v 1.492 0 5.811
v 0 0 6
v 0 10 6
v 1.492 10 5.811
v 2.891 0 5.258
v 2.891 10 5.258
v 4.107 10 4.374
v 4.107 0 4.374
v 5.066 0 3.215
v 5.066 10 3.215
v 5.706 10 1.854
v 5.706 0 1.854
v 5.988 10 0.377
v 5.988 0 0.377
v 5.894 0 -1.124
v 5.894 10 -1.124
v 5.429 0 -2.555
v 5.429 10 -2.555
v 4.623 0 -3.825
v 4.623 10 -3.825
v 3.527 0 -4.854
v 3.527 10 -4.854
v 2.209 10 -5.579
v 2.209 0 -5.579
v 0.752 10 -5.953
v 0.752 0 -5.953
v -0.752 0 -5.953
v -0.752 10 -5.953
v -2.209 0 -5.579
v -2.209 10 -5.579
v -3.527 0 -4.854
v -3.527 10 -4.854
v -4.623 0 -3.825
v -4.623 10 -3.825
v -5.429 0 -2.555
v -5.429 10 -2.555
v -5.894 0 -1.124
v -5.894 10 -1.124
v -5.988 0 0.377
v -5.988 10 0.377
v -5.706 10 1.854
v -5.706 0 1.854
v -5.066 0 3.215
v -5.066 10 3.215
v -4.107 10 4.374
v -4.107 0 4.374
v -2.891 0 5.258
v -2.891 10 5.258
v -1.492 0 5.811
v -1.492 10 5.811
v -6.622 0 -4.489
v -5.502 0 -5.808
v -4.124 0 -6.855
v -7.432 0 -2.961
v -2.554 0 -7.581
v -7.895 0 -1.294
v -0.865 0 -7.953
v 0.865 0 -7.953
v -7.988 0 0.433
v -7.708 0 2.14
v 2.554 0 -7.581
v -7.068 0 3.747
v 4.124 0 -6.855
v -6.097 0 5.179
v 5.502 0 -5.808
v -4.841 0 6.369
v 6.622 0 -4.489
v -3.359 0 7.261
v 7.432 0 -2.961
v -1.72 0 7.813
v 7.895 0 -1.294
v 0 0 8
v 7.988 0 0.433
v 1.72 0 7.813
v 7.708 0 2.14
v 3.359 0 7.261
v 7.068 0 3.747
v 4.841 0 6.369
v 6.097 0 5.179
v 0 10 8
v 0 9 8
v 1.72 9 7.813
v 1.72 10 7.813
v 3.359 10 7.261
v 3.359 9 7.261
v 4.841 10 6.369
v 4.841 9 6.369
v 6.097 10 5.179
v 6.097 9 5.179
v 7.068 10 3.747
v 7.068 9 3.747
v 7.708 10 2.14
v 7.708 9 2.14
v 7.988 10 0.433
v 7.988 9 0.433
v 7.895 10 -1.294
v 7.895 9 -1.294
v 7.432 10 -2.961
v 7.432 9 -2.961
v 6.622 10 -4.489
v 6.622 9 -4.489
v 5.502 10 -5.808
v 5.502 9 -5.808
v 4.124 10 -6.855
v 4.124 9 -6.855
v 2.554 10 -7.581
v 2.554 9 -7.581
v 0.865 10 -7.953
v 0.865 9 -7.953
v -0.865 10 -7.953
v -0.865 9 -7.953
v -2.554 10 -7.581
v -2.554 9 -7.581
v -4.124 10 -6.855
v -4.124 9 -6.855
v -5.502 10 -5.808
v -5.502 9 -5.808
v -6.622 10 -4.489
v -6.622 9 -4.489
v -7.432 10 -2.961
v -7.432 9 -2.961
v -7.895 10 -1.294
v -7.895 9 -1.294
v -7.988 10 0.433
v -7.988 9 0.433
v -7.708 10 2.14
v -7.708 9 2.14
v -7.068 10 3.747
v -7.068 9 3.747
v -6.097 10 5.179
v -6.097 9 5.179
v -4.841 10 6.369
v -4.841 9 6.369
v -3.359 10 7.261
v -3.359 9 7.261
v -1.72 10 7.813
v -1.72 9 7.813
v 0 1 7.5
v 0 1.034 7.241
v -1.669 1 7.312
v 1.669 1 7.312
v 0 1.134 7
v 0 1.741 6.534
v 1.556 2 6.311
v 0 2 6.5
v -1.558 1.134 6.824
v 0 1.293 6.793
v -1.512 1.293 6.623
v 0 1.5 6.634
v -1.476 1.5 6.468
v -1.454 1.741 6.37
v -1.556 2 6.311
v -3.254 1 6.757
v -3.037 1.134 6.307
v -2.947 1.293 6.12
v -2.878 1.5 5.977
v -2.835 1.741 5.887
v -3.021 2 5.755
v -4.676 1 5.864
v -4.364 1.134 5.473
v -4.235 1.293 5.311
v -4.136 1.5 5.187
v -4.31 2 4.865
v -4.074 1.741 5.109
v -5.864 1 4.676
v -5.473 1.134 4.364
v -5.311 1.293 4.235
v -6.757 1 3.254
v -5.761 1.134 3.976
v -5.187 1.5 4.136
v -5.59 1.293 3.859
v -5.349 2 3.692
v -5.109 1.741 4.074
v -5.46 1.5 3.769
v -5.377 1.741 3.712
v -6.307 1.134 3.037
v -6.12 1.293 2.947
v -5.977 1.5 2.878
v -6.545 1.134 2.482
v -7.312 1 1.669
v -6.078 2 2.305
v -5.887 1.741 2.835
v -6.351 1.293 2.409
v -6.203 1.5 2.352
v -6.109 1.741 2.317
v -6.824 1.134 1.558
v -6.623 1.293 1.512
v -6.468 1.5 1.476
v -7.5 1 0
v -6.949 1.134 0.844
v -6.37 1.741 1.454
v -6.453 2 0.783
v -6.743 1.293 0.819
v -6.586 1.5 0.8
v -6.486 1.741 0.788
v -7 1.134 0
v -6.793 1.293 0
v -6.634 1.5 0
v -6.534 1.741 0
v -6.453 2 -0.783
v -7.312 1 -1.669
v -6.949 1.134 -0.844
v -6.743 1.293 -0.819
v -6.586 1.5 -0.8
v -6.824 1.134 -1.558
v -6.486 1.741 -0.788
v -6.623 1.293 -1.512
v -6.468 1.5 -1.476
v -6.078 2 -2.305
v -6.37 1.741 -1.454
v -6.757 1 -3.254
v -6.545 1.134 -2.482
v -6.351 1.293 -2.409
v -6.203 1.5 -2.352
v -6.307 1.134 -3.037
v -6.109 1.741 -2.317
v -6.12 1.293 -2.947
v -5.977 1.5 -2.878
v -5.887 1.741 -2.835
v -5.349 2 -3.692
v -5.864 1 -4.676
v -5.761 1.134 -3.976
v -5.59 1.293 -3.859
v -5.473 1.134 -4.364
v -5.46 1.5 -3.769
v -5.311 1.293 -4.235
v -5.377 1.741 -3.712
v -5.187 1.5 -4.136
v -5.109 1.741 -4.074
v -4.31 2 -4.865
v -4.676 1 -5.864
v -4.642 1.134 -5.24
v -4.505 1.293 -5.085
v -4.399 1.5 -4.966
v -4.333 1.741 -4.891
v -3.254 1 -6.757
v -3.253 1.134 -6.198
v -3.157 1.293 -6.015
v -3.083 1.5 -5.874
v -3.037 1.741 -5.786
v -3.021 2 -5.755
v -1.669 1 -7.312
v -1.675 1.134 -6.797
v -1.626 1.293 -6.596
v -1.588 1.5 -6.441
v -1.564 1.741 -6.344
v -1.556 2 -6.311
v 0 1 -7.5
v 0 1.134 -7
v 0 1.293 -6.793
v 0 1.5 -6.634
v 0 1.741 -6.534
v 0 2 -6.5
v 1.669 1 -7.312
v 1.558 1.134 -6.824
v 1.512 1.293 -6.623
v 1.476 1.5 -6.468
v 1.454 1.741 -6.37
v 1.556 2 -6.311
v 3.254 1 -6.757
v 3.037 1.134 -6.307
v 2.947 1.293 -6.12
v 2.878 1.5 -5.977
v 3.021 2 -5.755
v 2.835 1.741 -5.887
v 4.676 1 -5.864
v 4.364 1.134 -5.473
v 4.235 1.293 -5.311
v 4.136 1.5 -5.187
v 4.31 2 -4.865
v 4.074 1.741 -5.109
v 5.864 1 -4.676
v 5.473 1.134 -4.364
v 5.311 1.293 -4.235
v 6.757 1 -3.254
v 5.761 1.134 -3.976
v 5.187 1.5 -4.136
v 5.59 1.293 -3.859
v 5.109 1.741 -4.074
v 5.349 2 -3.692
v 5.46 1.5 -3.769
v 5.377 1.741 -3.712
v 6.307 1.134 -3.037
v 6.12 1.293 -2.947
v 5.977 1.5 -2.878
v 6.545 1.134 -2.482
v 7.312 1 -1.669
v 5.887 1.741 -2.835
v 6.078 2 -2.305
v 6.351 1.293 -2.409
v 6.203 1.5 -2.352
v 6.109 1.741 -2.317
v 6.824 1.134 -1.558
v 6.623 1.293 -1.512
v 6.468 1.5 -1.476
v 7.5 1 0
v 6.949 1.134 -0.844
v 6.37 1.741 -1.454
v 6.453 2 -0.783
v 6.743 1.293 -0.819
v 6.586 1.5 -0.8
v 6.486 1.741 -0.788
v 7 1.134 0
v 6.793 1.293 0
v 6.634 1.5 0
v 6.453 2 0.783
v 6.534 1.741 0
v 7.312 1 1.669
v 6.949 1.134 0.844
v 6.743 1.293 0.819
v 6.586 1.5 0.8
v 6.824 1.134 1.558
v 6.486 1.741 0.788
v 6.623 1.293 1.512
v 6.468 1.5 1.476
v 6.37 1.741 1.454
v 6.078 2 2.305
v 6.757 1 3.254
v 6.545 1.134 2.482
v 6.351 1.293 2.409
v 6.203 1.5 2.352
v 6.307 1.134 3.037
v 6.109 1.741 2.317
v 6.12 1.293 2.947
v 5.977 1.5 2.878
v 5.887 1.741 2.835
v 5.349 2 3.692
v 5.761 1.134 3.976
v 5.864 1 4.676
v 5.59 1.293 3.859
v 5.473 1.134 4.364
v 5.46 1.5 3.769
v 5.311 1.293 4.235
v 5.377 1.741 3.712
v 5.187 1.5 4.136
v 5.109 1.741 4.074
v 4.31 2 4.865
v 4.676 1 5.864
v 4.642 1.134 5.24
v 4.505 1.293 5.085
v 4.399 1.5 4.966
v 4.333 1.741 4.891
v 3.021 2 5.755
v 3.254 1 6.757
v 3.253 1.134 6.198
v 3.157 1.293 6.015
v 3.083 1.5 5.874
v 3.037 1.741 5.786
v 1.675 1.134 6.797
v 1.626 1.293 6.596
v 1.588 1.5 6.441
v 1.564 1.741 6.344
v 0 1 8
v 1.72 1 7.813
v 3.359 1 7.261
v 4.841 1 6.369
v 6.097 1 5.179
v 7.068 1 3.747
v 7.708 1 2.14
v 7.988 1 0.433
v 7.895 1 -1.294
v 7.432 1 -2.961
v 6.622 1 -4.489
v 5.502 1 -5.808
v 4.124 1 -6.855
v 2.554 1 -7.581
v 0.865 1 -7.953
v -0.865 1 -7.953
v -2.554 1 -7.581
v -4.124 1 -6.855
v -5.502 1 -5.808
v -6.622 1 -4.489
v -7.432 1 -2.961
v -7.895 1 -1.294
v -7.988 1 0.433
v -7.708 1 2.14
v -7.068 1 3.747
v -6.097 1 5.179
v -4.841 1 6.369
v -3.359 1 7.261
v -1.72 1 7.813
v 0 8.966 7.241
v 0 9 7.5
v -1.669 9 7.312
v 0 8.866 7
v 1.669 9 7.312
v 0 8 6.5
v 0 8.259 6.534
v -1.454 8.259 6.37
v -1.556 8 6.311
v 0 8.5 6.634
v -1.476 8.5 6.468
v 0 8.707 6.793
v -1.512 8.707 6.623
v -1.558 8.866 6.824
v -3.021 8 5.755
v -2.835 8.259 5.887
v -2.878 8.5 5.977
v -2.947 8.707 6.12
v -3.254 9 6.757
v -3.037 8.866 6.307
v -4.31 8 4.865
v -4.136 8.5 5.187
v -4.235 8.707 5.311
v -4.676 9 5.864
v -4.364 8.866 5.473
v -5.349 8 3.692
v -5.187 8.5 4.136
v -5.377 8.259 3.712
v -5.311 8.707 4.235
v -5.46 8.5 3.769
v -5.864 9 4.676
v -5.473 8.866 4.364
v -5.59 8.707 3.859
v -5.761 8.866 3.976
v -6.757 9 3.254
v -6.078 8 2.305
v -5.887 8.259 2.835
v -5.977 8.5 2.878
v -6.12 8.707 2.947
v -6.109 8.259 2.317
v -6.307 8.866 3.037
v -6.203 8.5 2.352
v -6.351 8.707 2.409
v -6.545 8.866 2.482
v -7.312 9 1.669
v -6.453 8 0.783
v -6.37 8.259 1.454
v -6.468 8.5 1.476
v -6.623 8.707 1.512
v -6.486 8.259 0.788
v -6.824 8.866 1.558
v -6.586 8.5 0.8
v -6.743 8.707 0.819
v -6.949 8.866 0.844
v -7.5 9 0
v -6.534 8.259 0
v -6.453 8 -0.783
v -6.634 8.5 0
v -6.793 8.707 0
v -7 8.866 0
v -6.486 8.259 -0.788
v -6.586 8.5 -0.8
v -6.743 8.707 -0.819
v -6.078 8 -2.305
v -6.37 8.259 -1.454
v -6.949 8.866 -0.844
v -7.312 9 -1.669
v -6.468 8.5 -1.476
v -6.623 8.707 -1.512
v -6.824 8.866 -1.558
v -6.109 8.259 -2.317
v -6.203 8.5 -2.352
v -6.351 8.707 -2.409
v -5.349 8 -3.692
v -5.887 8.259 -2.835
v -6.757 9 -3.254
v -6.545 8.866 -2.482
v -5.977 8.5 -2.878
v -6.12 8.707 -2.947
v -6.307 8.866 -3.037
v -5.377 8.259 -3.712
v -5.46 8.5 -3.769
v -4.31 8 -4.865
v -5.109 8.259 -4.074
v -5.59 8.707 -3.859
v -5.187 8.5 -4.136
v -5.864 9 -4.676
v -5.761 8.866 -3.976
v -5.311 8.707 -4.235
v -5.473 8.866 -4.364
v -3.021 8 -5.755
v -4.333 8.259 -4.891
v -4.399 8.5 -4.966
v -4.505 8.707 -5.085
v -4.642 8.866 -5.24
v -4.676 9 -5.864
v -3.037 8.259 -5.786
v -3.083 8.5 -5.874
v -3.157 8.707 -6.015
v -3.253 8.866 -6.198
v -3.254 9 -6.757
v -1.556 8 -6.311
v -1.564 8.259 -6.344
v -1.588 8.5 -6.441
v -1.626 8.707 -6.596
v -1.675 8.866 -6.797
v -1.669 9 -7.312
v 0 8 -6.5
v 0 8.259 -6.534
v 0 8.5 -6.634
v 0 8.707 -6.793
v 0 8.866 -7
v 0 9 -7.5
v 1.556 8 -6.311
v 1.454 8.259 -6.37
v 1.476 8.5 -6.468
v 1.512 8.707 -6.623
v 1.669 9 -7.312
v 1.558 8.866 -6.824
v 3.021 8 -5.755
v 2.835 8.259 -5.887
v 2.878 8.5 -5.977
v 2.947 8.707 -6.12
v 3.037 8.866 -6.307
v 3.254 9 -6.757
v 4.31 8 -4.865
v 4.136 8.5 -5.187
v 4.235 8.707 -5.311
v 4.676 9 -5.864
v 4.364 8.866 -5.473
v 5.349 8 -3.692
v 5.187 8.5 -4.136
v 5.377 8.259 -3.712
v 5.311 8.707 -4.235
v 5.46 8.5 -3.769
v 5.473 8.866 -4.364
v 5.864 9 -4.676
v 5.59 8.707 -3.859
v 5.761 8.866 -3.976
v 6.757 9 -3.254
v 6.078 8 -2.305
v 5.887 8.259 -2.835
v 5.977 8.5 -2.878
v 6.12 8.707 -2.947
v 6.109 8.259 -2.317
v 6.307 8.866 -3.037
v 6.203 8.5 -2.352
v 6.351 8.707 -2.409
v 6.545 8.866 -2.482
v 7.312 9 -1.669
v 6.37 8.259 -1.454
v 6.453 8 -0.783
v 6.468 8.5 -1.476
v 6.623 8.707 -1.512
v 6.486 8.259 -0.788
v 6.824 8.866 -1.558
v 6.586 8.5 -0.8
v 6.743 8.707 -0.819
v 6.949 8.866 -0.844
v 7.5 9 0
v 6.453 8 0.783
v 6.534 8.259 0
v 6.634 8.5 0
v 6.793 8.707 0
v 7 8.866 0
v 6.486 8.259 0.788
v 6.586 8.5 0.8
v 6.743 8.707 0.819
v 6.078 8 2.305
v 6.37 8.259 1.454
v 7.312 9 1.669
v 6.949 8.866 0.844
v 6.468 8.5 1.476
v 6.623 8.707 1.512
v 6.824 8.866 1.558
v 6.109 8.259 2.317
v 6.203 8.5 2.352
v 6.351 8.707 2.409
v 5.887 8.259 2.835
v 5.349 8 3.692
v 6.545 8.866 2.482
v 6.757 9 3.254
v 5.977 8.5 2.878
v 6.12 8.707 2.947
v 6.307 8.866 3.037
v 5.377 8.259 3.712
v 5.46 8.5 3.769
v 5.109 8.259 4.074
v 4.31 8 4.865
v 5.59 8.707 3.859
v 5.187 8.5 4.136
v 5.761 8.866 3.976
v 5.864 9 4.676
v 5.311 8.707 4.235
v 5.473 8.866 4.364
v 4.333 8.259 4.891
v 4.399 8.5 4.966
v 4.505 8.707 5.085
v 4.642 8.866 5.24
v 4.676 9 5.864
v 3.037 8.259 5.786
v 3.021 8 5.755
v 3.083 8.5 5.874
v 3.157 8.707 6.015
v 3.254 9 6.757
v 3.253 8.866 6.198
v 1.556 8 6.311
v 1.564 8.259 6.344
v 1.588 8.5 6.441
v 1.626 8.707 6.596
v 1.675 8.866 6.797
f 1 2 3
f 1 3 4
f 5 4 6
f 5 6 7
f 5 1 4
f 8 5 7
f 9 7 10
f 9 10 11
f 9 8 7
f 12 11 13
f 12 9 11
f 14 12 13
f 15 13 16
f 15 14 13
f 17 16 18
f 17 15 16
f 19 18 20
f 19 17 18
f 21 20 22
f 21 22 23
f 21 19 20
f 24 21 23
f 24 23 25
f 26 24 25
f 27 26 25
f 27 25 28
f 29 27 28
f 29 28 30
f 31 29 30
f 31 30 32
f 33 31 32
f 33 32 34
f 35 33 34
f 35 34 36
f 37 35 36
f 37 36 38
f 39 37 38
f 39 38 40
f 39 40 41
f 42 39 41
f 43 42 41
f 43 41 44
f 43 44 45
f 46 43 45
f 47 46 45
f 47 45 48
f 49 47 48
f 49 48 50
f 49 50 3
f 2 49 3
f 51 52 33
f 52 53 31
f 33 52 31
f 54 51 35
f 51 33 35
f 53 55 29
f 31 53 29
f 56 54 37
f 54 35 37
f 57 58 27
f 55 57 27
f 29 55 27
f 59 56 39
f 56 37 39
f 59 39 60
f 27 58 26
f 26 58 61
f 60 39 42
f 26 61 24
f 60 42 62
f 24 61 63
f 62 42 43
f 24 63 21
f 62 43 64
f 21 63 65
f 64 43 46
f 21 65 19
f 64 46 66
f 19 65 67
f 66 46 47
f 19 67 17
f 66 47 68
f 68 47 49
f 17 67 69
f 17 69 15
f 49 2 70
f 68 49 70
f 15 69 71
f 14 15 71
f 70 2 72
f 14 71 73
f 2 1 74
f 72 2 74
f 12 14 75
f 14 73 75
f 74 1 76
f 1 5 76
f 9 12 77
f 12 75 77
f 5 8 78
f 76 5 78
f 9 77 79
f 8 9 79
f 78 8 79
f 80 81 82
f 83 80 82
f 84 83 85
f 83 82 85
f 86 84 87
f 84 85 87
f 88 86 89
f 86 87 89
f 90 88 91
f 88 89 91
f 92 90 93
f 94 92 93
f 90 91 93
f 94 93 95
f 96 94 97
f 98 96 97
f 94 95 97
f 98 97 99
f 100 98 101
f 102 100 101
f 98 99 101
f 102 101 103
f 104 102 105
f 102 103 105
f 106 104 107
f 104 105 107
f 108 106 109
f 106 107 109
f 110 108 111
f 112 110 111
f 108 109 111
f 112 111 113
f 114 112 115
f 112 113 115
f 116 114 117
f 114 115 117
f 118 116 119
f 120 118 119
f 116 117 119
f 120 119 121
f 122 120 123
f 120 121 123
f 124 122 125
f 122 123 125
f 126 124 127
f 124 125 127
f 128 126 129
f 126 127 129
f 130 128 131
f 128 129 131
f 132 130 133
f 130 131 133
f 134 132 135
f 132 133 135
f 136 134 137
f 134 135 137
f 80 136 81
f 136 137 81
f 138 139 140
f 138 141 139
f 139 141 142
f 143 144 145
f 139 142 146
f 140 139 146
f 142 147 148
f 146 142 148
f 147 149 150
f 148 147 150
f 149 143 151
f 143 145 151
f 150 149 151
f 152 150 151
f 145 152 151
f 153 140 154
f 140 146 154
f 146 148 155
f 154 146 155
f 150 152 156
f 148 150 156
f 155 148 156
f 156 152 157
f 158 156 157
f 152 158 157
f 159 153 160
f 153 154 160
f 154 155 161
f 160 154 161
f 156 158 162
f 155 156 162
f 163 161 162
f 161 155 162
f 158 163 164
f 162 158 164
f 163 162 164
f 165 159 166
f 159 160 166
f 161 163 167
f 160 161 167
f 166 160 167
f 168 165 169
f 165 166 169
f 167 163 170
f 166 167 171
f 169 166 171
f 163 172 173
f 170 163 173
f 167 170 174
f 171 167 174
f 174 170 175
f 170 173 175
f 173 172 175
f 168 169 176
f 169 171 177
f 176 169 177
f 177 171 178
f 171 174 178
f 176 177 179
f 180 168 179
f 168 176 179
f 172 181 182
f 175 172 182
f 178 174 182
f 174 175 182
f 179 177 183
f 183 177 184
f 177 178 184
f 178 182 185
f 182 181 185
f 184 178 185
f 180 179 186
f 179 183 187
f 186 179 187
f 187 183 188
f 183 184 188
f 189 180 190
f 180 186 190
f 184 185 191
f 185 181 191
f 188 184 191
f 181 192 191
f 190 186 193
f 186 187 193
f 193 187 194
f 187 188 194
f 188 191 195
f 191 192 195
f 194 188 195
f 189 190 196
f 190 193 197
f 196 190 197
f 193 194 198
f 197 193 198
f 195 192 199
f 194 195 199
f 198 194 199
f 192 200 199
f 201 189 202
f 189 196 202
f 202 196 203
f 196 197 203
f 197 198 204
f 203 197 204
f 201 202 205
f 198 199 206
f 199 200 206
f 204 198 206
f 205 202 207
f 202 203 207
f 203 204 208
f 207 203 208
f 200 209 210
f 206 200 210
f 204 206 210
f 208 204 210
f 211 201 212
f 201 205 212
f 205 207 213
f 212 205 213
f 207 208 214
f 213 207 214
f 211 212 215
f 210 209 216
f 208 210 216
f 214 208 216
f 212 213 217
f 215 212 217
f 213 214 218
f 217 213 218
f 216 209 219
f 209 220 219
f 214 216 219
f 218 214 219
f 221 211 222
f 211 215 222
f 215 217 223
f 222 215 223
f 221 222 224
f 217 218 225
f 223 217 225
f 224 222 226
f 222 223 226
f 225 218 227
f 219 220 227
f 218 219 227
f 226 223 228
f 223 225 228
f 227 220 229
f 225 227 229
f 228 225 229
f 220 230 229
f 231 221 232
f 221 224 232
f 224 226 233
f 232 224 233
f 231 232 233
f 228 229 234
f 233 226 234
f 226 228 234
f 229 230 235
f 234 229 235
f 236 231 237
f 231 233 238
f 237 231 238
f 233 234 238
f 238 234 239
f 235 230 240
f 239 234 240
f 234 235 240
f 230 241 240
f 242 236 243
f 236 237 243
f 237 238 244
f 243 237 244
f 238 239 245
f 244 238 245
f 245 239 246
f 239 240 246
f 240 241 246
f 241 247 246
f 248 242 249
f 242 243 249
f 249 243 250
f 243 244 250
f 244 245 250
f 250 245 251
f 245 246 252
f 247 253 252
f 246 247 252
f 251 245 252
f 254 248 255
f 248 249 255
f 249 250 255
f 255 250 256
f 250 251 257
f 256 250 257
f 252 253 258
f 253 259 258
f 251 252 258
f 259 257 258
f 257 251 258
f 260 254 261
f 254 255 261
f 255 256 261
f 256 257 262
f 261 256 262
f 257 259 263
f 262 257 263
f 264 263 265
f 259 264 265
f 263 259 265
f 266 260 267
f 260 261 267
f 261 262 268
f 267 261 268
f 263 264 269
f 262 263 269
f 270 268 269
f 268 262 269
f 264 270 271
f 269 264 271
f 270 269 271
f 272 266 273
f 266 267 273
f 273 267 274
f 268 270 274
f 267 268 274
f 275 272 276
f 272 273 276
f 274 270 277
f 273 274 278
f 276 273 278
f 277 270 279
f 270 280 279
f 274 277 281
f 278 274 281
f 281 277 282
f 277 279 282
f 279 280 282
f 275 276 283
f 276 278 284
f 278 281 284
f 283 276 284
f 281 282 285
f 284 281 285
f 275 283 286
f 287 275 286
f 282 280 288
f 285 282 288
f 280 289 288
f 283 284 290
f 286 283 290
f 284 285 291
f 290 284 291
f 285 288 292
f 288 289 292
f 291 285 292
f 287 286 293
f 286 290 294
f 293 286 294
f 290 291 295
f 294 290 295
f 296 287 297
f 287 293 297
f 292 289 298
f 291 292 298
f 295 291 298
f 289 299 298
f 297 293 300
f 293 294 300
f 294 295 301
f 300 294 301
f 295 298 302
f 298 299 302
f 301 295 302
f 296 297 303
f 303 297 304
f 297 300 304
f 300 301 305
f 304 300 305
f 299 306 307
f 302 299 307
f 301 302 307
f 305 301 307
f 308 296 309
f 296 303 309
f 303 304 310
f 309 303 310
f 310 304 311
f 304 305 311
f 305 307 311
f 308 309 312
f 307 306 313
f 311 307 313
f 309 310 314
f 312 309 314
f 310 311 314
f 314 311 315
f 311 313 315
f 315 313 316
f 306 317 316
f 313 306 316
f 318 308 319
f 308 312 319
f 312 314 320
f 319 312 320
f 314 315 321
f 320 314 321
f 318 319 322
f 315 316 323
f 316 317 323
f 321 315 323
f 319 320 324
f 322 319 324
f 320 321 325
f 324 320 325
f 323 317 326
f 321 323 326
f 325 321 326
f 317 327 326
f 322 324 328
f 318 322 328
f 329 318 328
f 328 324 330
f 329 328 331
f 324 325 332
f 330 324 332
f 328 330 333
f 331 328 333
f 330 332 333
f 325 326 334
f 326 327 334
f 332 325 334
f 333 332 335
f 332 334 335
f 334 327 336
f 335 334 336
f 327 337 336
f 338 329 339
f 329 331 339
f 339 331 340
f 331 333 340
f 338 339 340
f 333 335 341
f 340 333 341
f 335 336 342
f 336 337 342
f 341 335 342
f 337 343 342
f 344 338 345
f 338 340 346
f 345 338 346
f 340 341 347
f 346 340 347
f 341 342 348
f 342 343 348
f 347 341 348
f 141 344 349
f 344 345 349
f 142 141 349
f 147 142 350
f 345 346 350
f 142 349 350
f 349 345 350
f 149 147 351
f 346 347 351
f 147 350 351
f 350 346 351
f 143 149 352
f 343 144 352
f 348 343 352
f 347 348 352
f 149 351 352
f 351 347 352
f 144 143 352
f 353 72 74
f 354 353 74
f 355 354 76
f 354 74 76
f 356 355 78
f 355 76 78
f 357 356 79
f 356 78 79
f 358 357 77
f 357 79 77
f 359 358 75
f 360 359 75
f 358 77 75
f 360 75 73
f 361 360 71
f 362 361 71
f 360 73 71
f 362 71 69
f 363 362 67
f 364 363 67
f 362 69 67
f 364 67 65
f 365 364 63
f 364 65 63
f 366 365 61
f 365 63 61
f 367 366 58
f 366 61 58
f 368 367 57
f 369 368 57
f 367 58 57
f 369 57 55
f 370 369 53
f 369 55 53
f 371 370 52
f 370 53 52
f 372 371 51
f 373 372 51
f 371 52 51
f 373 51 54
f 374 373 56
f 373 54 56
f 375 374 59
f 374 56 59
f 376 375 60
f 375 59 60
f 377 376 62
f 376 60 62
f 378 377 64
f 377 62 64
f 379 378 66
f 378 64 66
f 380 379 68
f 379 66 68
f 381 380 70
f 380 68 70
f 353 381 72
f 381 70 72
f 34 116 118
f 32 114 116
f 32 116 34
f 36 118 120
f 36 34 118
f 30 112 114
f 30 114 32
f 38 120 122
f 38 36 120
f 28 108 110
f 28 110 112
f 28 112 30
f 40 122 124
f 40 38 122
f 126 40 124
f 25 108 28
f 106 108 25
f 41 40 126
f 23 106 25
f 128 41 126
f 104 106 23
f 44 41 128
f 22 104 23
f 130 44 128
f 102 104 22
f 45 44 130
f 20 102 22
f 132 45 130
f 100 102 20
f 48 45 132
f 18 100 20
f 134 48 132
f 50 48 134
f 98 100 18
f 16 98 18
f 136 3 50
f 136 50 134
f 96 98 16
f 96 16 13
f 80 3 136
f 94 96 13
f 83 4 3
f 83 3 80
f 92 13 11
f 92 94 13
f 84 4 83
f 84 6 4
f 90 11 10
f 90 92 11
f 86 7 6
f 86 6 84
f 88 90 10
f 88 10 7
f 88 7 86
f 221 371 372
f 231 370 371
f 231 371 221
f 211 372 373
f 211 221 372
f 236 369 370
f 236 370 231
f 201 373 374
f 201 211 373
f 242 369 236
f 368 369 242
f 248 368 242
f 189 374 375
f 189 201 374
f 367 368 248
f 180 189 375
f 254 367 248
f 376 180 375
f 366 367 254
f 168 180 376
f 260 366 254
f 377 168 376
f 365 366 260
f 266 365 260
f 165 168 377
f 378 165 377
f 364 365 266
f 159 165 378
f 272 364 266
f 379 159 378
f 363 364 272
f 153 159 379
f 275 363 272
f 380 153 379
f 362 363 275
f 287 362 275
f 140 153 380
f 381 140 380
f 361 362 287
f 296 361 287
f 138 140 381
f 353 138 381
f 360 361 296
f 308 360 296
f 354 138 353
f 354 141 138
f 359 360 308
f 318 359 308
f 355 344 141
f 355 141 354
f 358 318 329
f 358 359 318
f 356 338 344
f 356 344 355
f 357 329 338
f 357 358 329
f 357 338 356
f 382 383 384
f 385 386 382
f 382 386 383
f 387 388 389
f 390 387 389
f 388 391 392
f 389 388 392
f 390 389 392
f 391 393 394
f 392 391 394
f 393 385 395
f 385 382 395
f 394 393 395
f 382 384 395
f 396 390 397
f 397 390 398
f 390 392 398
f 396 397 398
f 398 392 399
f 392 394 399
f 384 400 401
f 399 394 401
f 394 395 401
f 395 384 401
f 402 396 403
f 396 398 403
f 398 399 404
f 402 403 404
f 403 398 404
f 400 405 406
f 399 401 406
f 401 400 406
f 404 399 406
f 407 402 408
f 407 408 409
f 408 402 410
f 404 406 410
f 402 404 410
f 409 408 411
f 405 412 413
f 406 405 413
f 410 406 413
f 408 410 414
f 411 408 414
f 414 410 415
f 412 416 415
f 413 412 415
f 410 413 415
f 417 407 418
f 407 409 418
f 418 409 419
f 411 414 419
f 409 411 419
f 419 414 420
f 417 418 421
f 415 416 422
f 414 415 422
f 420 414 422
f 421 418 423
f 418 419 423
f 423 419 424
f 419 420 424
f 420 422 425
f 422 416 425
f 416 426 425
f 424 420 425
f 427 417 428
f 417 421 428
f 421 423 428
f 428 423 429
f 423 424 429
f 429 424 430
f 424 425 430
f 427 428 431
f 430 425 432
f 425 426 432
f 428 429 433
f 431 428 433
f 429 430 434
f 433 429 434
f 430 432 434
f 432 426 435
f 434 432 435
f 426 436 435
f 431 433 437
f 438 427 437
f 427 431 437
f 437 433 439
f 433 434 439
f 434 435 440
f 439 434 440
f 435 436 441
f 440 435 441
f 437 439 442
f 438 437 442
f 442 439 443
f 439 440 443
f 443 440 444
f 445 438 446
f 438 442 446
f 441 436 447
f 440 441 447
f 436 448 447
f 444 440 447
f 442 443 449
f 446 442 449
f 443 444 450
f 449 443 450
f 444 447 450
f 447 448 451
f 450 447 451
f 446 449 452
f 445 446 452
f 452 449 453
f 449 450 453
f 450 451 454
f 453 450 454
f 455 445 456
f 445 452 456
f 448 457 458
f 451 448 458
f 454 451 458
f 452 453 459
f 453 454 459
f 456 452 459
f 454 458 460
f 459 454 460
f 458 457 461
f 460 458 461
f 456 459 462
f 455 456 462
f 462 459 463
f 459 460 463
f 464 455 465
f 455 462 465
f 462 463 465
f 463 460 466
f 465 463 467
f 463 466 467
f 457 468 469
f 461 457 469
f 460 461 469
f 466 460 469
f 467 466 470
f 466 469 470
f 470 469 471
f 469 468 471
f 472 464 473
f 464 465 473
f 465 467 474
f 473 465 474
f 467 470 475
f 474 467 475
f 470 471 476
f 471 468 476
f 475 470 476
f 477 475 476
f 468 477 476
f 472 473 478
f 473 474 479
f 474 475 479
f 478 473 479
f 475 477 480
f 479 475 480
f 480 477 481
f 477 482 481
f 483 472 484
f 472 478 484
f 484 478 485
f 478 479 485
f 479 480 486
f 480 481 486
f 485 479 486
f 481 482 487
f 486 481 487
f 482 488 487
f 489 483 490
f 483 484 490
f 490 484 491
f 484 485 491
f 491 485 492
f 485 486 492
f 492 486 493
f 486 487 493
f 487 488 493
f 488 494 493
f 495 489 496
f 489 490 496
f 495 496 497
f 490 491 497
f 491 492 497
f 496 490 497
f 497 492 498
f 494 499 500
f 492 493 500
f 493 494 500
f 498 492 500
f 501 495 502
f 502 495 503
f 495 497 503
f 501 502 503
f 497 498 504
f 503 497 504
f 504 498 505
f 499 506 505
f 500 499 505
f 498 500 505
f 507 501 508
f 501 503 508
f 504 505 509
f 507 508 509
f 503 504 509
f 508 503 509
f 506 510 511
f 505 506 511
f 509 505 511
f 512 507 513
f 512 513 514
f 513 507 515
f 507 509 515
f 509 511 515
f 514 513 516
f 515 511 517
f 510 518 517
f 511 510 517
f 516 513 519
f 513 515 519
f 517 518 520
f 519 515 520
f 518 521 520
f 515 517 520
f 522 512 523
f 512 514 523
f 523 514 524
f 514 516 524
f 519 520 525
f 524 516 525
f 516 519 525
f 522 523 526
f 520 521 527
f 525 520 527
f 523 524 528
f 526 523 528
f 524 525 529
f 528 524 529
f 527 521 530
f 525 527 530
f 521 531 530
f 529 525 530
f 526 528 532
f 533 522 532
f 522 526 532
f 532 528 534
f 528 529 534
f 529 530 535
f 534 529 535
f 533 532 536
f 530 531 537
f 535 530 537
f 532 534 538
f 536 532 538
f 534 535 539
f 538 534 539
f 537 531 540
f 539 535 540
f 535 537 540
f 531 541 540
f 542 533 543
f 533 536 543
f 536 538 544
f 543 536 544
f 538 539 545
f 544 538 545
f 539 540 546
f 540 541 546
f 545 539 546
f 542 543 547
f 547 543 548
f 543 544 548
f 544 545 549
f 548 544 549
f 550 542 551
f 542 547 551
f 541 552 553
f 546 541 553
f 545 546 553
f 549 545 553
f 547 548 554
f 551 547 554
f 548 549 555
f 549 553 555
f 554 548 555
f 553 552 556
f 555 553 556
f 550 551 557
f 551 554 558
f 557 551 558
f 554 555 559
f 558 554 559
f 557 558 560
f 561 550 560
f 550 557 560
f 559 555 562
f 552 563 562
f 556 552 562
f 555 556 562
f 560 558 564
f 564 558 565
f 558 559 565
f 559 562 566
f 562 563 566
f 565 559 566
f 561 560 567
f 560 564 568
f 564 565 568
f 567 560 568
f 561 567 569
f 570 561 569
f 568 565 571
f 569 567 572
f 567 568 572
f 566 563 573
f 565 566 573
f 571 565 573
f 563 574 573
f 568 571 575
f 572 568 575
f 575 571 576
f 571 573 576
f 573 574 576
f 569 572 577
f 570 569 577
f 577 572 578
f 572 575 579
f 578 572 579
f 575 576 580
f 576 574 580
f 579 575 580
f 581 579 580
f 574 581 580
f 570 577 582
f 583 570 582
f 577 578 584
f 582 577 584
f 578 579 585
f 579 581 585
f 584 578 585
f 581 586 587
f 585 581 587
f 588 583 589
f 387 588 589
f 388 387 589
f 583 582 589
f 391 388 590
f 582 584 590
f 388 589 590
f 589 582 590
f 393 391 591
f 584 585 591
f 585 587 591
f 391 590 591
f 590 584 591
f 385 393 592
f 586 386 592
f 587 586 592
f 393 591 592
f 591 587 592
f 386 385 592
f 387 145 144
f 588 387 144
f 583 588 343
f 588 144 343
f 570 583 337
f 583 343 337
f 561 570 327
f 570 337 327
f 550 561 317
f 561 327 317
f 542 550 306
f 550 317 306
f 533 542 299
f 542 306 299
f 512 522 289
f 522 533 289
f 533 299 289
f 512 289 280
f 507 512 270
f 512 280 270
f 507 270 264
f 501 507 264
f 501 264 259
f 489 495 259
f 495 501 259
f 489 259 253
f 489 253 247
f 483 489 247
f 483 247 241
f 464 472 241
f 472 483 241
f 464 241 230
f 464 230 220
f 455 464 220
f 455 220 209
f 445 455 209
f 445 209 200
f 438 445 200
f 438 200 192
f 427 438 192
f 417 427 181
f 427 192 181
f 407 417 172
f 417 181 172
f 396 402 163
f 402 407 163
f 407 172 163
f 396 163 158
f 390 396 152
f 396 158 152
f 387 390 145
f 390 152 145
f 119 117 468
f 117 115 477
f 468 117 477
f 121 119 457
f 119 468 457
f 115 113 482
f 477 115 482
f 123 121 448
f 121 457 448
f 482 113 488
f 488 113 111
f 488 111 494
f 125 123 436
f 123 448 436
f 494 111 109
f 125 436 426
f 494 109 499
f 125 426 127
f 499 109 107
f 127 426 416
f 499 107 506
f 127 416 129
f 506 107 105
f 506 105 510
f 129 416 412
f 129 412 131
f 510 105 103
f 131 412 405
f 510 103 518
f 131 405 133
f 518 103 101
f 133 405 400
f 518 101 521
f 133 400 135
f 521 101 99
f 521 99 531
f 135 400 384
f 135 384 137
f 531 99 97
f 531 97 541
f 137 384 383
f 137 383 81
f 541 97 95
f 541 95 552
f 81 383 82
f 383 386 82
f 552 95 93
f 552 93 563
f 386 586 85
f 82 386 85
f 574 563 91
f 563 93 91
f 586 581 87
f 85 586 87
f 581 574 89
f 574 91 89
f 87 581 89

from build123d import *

# Parameters (mm, degrees)
SKETCH1_R           = 6.5
SKETCH1_R_2         = 6
BOSS_EXTRUDE1_DEPTH = 10
BOSS_EXTRUDE2_START = -1
SKETCH2_R           = 8
SKETCH2_R_2         = 6
BOSS_EXTRUDE2_DEPTH = 1
LPATTERN1_COUNT     = 2
LPATTERN1_PITCH     = 9
FILLET1_R           = 1


with BuildPart() as part:
    # Sketch1 → Boss-Extrude1 (new body)
    with BuildSketch(Plane(origin=(0, 0, 0), x_dir=(1, 0, 0), z_dir=(0, 1, 0))):
        with Locations(Location((0, 0, 0), (0, 0, 270))):
            Circle(SKETCH1_R)
        with Locations(Location((0, 0, 0), (0, 0, 270))):
            Circle(SKETCH1_R_2, mode=Mode.SUBTRACT)
    extrude(amount=BOSS_EXTRUDE1_DEPTH)

    # Sketch2 → Boss-Extrude2 (add)
    with BuildSketch(Plane(origin=(0, 10, 0), x_dir=(1, 0, 0), z_dir=(0, 1, 0)).offset(BOSS_EXTRUDE2_START)):
        with Locations(Location((0, 0, 0), (0, 0, 270))):
            Circle(SKETCH2_R)
        with Locations(Location((0, 0, 0), (0, 0, 270))):
            Circle(SKETCH2_R_2, mode=Mode.SUBTRACT)
    boss_extrude2 = extrude(amount=BOSS_EXTRUDE2_DEPTH)

    # LPattern1: Boss-Extrude2 ×2
    with Locations(*[(0, -i * LPATTERN1_PITCH, 0) for i in range(1, LPATTERN1_COUNT)]):
        add(boss_extrude2)

    # Fillet1
    fillet1_edges = [part.edges().sort_by_distance(p)[0] for p in [
        (0, 9, -6.5),
        (0, 1, -6.5),
    ]]
    fillet(fillet1_edges, radius=FILLET1_R)


solid = part.part
